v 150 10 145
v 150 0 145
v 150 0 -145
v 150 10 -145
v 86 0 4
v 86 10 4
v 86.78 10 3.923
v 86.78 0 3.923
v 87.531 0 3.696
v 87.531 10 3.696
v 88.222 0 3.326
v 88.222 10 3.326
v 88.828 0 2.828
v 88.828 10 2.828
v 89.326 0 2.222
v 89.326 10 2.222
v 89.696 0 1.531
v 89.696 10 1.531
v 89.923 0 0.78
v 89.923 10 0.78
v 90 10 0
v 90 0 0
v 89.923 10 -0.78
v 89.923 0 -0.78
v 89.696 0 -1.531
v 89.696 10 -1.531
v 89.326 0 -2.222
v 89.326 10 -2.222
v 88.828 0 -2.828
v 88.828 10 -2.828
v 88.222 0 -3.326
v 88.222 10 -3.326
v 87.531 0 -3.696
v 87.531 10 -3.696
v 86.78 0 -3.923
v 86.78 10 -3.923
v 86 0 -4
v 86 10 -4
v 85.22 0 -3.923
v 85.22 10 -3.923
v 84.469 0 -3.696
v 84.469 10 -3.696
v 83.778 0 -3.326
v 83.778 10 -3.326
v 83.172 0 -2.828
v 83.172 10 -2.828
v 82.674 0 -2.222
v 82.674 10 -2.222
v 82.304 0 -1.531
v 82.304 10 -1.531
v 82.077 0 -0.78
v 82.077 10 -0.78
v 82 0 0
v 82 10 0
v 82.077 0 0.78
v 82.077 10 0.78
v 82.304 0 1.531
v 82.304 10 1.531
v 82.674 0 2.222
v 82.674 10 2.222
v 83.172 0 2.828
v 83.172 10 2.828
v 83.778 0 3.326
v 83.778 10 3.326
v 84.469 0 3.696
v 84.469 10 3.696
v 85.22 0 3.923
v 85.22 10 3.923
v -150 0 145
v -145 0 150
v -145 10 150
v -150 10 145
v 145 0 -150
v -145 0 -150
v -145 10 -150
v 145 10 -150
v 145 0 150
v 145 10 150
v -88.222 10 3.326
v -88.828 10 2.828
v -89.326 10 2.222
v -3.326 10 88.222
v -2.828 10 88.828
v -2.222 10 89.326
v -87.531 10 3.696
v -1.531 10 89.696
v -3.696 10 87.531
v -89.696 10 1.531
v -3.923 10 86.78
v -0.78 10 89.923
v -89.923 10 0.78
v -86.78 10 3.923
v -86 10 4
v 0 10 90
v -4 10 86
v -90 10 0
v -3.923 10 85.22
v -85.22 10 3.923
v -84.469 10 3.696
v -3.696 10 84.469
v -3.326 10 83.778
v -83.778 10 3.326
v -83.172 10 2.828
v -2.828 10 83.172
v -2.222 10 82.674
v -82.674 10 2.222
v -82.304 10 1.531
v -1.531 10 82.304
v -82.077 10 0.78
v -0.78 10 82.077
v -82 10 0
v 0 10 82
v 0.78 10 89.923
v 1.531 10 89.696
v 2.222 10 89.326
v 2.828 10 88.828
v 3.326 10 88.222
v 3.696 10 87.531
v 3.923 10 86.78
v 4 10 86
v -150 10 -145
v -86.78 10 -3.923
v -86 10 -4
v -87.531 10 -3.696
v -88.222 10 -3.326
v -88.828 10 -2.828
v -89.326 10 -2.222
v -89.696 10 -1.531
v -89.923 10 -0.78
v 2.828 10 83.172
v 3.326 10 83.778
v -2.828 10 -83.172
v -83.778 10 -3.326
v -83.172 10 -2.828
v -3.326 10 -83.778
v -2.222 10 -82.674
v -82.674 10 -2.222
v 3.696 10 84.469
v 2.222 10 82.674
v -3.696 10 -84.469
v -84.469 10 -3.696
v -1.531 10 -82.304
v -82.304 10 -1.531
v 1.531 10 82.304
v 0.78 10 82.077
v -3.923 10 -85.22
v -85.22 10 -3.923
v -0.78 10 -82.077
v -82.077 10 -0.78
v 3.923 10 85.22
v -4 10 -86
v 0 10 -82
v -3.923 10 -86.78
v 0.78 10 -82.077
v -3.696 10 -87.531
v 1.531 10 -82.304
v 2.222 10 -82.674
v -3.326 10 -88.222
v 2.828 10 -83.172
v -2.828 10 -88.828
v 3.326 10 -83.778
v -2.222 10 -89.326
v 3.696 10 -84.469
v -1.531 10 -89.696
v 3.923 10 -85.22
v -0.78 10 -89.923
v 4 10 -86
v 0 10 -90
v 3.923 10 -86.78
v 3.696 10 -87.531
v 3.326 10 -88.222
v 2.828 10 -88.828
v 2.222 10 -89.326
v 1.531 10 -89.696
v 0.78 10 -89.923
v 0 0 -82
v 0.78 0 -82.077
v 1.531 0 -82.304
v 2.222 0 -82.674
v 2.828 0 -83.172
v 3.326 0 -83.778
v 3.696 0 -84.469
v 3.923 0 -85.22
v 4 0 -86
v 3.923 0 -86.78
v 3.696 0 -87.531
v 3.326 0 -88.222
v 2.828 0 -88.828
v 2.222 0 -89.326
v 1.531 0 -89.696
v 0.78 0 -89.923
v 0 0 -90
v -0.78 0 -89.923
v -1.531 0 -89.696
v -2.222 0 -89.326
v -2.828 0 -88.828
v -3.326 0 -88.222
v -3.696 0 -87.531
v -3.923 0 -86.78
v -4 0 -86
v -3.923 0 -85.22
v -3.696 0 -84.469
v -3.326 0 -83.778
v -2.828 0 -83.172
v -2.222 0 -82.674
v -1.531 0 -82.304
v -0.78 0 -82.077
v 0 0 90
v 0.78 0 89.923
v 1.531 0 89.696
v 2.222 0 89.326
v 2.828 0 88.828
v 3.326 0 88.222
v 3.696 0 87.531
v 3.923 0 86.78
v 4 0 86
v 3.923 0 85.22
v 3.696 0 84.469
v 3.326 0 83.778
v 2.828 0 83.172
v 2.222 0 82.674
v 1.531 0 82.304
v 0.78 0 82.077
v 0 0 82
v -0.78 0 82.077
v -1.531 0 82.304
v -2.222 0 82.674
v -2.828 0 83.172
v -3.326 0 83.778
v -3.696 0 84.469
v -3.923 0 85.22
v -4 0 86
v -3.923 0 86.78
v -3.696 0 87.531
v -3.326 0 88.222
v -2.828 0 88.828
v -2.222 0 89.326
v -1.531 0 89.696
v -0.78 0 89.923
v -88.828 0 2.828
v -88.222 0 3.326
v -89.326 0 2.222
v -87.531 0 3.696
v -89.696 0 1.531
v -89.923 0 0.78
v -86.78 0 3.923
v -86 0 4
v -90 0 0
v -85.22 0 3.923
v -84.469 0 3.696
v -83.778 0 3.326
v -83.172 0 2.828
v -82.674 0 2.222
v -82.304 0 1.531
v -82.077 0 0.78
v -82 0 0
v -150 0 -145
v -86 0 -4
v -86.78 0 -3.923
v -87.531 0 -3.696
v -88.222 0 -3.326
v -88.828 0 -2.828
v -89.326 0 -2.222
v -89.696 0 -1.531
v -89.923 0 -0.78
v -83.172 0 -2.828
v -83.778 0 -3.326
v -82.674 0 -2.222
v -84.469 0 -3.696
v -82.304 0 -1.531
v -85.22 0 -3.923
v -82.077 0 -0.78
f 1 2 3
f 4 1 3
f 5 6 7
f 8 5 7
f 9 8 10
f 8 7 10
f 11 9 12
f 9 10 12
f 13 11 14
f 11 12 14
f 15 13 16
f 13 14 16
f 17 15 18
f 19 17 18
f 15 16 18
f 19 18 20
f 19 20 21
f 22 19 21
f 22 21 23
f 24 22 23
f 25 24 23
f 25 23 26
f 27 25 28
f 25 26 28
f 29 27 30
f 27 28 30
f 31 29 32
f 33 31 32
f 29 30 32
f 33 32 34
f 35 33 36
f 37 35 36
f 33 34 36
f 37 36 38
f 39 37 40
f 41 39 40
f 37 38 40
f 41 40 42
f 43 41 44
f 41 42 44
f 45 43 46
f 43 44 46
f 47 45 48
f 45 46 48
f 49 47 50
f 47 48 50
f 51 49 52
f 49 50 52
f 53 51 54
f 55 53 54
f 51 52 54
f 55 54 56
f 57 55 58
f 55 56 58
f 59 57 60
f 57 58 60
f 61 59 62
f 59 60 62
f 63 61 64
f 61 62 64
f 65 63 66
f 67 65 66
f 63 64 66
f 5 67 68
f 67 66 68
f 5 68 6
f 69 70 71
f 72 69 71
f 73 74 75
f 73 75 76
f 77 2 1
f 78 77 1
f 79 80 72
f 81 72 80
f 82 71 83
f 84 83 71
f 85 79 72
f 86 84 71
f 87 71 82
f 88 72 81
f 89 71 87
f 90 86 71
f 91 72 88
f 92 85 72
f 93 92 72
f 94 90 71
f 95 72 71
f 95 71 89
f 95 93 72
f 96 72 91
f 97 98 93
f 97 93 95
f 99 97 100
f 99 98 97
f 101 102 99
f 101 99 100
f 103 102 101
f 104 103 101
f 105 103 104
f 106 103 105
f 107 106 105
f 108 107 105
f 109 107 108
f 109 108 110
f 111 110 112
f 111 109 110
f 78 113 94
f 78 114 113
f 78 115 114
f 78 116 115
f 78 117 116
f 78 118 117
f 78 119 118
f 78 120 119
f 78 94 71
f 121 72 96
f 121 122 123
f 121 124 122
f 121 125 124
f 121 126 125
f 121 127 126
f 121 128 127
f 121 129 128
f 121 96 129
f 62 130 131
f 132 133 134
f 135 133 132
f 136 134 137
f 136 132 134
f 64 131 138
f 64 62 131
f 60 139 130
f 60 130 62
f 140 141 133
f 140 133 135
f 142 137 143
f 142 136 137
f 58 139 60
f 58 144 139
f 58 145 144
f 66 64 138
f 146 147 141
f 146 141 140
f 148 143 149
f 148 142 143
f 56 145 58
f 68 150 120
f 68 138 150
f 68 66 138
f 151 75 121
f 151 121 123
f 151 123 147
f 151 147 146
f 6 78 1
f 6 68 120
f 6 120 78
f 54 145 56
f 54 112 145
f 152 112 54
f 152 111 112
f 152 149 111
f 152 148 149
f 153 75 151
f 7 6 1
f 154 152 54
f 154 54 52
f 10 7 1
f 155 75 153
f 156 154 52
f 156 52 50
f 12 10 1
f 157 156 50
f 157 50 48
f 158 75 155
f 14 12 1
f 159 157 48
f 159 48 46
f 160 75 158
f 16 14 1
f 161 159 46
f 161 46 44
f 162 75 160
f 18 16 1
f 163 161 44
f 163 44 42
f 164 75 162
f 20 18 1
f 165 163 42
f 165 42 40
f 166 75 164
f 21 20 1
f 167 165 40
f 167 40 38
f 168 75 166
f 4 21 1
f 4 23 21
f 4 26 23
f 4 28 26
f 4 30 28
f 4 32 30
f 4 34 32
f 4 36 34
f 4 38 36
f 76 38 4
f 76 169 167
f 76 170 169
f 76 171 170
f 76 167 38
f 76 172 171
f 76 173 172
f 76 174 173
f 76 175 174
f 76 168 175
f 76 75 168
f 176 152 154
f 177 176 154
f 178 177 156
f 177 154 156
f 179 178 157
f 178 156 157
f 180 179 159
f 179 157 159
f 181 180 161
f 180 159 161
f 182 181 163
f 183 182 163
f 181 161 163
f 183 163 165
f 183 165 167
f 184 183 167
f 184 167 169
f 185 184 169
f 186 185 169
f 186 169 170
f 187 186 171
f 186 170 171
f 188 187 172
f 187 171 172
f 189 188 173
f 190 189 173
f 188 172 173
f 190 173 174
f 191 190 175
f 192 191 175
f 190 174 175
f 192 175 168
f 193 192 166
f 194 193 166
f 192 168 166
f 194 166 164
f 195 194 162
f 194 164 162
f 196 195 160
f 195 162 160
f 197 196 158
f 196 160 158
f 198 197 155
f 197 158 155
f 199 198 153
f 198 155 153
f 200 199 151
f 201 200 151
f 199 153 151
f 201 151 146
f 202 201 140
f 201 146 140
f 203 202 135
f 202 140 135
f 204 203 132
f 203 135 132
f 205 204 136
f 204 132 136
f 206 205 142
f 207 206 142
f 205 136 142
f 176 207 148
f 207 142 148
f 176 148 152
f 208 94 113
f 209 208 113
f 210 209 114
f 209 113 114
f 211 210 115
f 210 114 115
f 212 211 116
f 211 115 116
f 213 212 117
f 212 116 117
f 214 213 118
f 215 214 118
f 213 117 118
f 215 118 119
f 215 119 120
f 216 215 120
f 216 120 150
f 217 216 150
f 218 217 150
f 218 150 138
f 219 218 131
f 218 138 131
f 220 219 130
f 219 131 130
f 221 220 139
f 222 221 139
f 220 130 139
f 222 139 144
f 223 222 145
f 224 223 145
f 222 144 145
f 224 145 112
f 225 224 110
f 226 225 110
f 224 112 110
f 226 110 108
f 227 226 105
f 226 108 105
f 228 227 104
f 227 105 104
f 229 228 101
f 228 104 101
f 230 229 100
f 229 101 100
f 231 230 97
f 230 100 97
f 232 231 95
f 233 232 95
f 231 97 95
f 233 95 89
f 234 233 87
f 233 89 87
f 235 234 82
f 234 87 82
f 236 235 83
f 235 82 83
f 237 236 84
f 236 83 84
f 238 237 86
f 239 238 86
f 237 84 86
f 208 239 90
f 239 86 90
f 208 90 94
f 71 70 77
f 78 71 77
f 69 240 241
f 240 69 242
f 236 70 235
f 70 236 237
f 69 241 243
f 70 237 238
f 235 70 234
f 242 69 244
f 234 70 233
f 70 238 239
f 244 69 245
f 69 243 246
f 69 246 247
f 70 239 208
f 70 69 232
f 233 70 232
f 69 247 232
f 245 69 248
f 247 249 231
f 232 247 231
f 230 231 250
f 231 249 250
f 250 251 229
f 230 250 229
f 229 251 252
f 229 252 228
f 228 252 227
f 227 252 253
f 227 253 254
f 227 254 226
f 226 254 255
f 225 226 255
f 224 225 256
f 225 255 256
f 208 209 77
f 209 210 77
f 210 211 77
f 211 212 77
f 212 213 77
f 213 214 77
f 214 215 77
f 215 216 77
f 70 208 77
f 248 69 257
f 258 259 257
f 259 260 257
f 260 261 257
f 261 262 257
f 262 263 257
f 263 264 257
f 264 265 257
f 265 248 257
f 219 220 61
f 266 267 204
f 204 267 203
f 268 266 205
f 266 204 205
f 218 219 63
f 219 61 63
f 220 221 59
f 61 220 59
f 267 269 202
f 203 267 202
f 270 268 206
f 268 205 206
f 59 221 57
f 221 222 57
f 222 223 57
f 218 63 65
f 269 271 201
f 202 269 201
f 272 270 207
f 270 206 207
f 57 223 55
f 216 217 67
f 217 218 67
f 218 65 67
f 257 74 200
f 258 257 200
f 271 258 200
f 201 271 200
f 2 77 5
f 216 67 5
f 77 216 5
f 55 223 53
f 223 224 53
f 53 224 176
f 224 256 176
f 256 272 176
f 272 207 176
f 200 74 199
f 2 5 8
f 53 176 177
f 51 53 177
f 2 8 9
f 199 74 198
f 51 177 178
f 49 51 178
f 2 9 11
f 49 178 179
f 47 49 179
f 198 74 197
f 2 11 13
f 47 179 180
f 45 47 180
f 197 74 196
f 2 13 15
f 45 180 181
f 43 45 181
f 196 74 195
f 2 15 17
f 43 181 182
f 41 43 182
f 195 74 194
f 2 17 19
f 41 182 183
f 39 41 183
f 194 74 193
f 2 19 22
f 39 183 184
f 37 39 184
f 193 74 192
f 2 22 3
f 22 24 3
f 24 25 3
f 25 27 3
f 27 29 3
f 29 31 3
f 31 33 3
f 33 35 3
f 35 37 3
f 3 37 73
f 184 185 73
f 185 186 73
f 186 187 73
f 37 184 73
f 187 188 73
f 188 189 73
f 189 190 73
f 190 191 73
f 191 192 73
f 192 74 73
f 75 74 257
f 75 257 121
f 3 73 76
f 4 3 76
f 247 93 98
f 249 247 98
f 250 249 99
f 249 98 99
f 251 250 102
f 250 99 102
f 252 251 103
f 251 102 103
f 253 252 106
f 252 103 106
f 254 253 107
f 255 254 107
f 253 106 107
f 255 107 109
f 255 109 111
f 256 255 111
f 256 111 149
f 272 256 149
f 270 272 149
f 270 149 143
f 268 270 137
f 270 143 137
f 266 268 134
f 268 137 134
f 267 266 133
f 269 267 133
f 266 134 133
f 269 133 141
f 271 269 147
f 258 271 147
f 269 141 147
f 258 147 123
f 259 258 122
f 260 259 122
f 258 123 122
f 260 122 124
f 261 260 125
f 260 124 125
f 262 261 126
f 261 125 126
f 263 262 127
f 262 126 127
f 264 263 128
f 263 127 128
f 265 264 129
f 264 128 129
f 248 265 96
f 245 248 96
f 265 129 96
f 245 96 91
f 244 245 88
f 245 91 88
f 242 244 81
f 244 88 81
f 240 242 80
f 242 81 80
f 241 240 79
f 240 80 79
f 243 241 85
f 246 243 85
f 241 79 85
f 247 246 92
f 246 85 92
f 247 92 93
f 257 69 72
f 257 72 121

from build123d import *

# Parameters (mm, degrees)
SKETCH_1_W          = 300
SKETCH_1_H          = 300
EXTRUDE_1_DEPTH     = 10
CHAMFER_1_SIZE      = 5
SKETCH_2_R          = 4
CUT_EXTRUDE_1_DEPTH = 10


with BuildPart() as part:
    # 스케치1 → 보스-돌출1 (new body)
    with BuildSketch(Plane(origin=(0, 0, 0), x_dir=(1, 0, 0), z_dir=(0, 1, 0))):
        Rectangle(SKETCH_1_W, SKETCH_1_H)
    extrude(amount=EXTRUDE_1_DEPTH)

    # 모따기1
    chamfer_1_edges = [part.edges().sort_by_distance(p)[0] for p in [
        (150, 5, 150),
        (-150, 5, 150),
        (-150, 5, -150),
        (150, 5, -150),
    ]]
    chamfer(chamfer_1_edges, length=CHAMFER_1_SIZE)

    # 스케치2 → 컷-돌출1 (cut)
    with BuildSketch(Plane(origin=(0, 10, 0), x_dir=(1, 0, 0), z_dir=(0, 1, 0))):
        with Locations(Location((0, -86, 0), (0, 0, 270))):
            Circle(SKETCH_2_R)
        with Locations(Location((-86, 0, 0), (0, 0, 270))):
            Circle(SKETCH_2_R)
        with Locations(Location((0, 86, 0), (0, 0, 270))):
            Circle(SKETCH_2_R)
        with Locations(Location((86, 0, 0), (0, 0, 270))):
            Circle(SKETCH_2_R)
    extrude(amount=-CUT_EXTRUDE_1_DEPTH, mode=Mode.SUBTRACT)


solid = part.part
